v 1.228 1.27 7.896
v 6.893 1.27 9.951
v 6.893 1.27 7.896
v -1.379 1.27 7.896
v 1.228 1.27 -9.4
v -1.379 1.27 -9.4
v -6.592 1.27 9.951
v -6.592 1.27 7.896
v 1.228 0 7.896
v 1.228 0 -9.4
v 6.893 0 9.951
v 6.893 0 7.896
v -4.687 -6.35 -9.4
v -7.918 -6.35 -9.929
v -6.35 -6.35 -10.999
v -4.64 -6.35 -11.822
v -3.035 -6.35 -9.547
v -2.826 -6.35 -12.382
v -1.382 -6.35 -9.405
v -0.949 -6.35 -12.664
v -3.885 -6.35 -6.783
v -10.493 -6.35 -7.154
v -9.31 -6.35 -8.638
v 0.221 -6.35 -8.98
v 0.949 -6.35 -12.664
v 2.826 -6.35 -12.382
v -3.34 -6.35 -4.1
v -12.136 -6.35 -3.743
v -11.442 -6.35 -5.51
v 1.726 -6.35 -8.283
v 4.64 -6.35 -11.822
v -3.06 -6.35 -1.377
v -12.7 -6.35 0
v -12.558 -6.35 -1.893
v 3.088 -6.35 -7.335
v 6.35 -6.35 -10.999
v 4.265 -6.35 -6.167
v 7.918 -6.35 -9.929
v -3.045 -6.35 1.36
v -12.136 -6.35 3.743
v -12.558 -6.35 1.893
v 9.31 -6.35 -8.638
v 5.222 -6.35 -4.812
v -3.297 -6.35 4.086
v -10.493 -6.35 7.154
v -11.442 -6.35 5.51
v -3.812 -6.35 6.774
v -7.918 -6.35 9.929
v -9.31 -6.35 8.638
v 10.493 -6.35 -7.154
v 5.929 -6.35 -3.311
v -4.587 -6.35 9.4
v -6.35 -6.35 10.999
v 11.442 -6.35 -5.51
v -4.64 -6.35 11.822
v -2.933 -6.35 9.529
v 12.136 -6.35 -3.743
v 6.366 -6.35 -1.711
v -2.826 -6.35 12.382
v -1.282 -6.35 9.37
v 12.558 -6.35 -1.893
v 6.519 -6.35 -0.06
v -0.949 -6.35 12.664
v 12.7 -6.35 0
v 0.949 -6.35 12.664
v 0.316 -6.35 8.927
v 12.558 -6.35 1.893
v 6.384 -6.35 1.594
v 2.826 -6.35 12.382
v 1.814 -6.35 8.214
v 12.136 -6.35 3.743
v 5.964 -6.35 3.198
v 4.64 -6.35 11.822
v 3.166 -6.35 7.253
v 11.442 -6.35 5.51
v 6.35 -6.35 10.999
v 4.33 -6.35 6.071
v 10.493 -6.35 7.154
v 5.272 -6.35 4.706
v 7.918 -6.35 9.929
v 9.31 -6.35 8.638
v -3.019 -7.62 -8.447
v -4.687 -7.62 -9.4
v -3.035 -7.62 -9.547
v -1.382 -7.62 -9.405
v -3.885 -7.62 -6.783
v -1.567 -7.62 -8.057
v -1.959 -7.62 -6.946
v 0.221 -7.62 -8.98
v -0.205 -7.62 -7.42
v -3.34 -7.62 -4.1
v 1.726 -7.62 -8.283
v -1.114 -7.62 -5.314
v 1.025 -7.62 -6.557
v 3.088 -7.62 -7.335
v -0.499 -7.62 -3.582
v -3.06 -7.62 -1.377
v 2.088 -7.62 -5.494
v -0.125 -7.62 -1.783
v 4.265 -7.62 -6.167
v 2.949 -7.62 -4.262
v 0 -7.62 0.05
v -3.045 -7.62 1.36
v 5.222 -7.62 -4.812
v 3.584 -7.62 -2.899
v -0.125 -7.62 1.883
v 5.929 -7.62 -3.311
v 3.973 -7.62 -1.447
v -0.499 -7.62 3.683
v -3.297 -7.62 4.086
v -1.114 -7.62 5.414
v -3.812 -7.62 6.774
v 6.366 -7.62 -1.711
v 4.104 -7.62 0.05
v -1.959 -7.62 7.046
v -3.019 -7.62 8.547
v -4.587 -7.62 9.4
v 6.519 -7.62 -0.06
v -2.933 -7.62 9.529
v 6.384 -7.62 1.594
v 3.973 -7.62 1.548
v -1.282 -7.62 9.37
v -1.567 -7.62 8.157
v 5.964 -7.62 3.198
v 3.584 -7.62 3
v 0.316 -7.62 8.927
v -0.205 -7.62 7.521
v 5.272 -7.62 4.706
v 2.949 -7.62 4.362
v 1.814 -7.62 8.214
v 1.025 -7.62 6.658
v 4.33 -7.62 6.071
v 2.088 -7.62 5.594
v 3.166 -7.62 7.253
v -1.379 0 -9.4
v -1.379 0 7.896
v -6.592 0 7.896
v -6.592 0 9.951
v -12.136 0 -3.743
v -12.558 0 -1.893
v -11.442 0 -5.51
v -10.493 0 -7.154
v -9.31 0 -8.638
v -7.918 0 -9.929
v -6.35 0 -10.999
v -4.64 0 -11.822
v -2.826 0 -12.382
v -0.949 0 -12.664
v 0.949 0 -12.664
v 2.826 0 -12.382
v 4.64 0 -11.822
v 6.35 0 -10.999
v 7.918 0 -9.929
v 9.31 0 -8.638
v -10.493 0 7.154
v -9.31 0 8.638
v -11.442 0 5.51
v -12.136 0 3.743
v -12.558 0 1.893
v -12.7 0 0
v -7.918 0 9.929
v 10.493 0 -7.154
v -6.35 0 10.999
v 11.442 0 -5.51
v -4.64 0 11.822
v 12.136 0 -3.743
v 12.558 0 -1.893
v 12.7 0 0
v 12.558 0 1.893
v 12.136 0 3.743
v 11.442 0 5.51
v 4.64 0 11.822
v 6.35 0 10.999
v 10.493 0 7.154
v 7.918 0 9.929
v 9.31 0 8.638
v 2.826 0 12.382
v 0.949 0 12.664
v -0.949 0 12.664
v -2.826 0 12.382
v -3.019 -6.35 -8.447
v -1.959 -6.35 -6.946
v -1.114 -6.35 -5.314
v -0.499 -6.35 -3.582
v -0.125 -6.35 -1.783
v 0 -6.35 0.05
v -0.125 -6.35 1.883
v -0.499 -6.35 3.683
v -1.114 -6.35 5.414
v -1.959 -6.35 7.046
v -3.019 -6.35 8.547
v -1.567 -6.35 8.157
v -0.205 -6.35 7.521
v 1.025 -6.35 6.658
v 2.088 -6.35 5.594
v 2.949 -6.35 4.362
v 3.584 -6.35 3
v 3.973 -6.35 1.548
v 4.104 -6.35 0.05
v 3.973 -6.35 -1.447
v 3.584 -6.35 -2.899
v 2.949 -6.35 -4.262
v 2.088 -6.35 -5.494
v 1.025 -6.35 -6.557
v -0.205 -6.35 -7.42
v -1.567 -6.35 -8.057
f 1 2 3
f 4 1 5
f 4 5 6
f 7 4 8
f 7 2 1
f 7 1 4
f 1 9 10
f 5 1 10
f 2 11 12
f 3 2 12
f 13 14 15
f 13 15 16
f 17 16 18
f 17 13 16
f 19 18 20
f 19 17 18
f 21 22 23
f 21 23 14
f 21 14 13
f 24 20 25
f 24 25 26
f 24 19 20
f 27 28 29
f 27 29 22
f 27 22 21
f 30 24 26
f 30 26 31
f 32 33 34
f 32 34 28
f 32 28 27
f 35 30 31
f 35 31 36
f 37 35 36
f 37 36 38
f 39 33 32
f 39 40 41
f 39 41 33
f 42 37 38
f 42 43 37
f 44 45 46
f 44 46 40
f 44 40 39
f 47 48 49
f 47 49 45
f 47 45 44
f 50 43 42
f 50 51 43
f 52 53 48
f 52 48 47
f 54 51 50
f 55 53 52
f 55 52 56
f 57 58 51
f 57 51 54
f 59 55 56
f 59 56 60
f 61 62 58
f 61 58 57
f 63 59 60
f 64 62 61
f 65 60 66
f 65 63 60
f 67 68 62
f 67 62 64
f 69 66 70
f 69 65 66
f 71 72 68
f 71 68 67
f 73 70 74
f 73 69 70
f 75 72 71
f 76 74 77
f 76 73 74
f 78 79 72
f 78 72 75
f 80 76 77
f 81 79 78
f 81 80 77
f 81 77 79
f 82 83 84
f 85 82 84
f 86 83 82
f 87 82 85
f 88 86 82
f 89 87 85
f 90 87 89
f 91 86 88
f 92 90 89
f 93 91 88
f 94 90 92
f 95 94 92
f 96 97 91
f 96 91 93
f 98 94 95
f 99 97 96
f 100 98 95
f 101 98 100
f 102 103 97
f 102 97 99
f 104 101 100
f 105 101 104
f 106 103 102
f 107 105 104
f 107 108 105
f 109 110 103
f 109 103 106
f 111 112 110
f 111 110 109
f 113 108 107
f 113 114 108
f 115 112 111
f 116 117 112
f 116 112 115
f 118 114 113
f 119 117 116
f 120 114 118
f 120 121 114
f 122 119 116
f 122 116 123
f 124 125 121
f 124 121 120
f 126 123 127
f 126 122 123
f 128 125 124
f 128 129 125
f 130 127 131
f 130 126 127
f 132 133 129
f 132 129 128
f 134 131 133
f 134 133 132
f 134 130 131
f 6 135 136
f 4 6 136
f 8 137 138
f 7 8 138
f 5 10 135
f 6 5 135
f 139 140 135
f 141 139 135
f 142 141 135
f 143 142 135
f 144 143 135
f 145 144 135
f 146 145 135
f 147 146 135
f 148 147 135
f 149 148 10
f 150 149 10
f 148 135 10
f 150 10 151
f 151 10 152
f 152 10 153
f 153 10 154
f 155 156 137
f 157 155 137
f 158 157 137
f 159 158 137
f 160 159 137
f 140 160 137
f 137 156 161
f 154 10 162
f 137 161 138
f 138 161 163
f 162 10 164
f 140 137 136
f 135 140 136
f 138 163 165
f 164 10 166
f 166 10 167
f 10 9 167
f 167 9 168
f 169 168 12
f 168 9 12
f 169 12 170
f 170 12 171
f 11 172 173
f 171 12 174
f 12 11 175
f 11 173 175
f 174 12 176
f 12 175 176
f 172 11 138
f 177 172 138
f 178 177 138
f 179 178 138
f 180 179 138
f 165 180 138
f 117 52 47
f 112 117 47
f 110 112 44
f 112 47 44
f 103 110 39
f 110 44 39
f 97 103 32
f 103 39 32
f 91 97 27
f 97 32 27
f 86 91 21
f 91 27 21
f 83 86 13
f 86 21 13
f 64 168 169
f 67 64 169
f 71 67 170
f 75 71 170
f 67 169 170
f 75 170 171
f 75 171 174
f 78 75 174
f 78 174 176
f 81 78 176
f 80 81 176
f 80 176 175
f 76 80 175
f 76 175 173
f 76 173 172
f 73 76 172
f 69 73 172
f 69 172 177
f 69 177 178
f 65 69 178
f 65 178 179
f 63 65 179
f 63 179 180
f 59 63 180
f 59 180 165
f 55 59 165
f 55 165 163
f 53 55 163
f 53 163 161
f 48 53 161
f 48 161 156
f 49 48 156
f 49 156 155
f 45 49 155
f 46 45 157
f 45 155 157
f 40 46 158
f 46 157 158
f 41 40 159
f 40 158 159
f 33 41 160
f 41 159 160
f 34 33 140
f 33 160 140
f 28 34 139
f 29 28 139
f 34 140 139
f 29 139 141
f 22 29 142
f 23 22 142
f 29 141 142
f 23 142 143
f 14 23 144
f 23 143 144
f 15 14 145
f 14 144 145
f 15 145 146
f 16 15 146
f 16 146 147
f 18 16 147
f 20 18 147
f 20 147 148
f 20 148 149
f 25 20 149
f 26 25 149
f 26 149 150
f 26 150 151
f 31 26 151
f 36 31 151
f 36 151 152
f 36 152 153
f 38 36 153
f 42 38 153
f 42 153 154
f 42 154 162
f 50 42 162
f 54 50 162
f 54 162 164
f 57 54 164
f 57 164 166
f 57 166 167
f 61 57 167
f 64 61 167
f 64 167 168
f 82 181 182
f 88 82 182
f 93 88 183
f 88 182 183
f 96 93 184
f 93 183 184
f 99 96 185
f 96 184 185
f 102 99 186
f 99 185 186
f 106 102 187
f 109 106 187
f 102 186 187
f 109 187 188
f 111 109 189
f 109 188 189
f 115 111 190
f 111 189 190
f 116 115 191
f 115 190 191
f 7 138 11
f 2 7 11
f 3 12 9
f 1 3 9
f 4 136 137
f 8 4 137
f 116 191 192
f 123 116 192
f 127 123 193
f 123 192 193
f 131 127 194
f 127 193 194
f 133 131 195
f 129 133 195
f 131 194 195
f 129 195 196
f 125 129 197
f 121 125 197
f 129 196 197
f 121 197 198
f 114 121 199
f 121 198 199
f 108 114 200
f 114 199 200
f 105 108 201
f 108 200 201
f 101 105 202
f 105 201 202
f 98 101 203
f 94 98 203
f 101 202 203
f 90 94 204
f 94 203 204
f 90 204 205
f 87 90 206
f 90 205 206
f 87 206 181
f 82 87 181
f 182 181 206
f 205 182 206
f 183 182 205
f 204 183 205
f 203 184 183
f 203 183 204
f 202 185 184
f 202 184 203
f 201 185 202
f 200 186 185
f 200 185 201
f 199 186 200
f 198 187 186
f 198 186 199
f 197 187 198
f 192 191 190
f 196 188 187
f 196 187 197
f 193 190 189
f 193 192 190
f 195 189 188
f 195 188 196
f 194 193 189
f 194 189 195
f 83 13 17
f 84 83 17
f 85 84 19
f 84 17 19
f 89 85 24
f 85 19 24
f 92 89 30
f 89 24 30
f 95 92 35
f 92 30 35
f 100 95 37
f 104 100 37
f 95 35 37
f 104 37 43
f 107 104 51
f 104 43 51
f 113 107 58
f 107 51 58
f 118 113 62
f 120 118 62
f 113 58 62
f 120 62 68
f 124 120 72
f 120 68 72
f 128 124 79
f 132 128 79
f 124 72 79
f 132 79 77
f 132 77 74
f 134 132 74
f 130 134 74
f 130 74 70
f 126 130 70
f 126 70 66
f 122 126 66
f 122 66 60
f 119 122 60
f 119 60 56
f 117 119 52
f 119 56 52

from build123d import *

# Parameters (mm, degrees)
F0_R      = 12.7
F1_DEPTH  = 25.4
F1_FACE_R = 12.7
F2_DEPTH  = 19.05
F4_DEPTH  = 1.27
F5_W      = 2.606842
F5_H      = 9.399671
F6_DEPTH  = 1.27


with BuildPart() as f1:
    # F0 (on Front) → F1 (new body)
    with BuildSketch(Plane.XZ):
        Circle(F0_R)
    extrude(amount=F1_DEPTH)

    # F1_face (on face) → F2 (cut)
    with BuildSketch(Plane.XZ.offset(25.4)):
        Circle(F1_FACE_R)
    extrude(amount=-F2_DEPTH, mode=Mode.SUBTRACT)

    # F3 (on face) → F4 (join)
    with BuildSketch(Plane.XZ.offset(6.35)):
        with BuildLine():
            ThreePointArc((-4.587039, 9.399671), (-3.018959, -0.00863), (-4.687303, -9.399671))
            ThreePointArc((-4.687303, -9.399671), (6.518988, -0.0595), (-4.587039, 9.399671))
        make_face()
        with BuildLine():
            ThreePointArc((-3.018959, 8.547434), (4.103795, 0.050131), (-3.018959, -8.447171))
            ThreePointArc((-3.018959, -8.447171), (9.3e-05, 0.050131), (-3.018959, 8.547434))
        make_face(mode=Mode.SUBTRACT)
    extrude(amount=F4_DEPTH)

    # F5 (on face) → F6 (join)
    with BuildSketch(Plane(origin=(0, 0, 0), x_dir=(-1, 0, 0), z_dir=(0, 1, 0))):
        Polygon((-1.228224, 7.895724), (-1.228224, 0), (1.378618, 0), (1.378618, 7.895724), (6.592303, 7.895724), (6.592303, 9.951118), (-6.893092, 9.951118), (-6.893092, 7.895724), align=None)
        with Locations((0.075197, -4.699835)):
            Rectangle(F5_W, F5_H)
    extrude(amount=F6_DEPTH)


solid = f1.part
